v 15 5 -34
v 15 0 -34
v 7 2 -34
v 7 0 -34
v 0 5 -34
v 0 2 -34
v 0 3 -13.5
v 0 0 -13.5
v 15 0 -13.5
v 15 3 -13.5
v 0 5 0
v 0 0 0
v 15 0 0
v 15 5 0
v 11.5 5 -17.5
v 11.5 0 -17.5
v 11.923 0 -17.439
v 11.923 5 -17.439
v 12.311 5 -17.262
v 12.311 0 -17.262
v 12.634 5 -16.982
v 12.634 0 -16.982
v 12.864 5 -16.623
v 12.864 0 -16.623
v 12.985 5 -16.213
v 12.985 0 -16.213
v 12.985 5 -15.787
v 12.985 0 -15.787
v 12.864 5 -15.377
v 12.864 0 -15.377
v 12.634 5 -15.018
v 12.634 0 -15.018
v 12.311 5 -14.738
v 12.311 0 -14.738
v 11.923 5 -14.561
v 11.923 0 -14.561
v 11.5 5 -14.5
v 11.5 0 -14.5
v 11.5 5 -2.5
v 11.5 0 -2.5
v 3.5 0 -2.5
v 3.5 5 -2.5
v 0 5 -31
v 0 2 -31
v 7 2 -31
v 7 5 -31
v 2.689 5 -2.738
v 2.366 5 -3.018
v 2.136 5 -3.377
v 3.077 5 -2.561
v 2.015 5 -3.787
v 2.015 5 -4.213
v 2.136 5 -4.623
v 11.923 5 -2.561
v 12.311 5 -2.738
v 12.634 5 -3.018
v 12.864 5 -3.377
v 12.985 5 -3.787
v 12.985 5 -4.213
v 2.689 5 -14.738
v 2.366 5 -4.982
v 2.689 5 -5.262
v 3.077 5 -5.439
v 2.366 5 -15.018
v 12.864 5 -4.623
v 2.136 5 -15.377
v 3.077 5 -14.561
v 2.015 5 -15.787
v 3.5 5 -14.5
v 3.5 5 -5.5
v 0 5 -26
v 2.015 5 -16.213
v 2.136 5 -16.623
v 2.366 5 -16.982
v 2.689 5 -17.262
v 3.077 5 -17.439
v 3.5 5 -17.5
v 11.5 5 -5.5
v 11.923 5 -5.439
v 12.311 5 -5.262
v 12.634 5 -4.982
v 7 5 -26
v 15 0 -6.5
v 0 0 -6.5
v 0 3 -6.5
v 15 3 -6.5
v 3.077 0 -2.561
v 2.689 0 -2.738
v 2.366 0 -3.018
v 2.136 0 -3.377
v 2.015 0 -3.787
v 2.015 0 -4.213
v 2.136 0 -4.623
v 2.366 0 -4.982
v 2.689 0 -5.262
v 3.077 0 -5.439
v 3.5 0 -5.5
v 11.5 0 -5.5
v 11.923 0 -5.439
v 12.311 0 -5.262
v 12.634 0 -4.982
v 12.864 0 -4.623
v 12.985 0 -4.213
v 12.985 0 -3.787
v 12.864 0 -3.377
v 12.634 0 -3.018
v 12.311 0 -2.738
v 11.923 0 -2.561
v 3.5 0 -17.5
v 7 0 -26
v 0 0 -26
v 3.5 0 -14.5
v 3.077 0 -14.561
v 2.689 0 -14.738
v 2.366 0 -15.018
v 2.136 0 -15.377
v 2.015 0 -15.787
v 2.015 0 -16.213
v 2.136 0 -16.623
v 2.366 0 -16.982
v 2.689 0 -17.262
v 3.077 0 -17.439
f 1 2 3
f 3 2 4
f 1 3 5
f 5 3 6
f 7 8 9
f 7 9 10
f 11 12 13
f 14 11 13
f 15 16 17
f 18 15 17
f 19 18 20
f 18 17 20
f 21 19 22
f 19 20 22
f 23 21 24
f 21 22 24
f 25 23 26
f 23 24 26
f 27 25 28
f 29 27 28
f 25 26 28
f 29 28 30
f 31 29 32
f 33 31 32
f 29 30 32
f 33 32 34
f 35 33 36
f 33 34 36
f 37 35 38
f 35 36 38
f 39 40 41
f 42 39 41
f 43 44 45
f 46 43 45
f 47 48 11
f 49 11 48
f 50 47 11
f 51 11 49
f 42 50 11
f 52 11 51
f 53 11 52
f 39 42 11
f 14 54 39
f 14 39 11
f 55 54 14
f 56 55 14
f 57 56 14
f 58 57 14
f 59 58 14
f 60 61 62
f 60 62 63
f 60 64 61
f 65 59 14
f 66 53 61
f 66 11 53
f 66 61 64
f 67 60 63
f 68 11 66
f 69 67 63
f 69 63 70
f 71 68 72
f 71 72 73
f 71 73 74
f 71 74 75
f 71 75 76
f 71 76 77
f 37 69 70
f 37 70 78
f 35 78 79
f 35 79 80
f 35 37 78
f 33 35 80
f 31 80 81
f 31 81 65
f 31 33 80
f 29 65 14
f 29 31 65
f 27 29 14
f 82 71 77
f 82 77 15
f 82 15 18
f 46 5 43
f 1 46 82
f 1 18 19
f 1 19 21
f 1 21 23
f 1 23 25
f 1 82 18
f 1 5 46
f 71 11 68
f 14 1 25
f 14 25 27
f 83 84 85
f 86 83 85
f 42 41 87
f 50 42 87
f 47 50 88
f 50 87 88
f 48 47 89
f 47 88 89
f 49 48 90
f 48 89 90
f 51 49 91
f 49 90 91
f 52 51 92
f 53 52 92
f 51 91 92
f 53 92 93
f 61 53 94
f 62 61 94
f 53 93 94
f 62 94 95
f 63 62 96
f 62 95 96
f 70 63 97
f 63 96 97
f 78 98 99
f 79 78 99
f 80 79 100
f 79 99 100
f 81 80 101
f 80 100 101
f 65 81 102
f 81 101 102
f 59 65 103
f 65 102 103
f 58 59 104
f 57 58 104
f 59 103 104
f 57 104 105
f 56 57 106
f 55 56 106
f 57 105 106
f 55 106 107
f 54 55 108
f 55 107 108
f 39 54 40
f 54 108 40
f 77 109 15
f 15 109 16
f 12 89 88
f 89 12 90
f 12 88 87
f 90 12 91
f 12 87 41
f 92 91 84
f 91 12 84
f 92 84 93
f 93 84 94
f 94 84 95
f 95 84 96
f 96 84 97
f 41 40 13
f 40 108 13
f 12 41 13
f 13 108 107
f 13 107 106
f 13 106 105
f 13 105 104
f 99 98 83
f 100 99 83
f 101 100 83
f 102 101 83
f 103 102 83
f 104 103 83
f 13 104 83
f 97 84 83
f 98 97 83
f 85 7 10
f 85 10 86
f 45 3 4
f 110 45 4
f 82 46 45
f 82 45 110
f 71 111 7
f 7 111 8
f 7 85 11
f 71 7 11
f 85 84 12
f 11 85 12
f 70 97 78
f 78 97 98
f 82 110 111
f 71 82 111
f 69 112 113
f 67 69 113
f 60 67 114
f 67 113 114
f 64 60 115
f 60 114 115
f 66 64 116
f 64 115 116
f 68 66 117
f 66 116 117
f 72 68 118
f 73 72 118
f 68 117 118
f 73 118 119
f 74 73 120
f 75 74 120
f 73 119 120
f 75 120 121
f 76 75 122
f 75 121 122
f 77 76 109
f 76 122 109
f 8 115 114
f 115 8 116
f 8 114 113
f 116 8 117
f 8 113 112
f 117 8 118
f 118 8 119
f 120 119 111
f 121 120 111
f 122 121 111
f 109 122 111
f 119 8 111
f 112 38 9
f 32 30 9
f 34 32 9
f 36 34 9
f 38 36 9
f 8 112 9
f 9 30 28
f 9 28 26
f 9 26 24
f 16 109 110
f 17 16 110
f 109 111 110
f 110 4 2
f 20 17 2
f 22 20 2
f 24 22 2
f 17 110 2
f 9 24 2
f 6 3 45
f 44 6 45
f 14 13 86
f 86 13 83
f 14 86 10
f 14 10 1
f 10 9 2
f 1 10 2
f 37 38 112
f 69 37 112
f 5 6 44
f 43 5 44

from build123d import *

# Parameters (mm, degrees)
EXTRUDE_1_DEPTH     = 5
SKETCH_2_W          = 7
SKETCH_2_H          = 3
CUT_EXTRUDE_1_DEPTH = 16
SKETCH_3_W          = 3
SKETCH_3_H          = 2
CUT_EXTRUDE_2_DEPTH = 12


with BuildPart() as part:
    # 草图1 → 凸台-拉伸1 (new body)
    with BuildSketch(Plane(origin=(0, 0, 0), x_dir=(1, 0, 0), z_dir=(0, 1, 0))):
        Polygon((15, 34), (0, 34), (0, 31), (7, 31), (7, 26), (0, 26), (0, 0), (15, 0), align=None)
        with BuildLine():
            ThreePointArc((3.5, 2.5), (2, 4), (3.5, 5.5))
            Line((3.5, 5.5), (11.5, 5.5))
            ThreePointArc((11.5, 5.5), (13, 4), (11.5, 2.5))
            Line((11.5, 2.5), (3.5, 2.5))
        make_face(mode=Mode.SUBTRACT)
        with BuildLine():
            ThreePointArc((3.5, 14.5), (2, 16), (3.5, 17.5))
            Line((3.5, 17.5), (11.5, 17.5))
            ThreePointArc((11.5, 17.5), (13, 16), (11.5, 14.5))
            Line((11.5, 14.5), (3.5, 14.5))
        make_face(mode=Mode.SUBTRACT)
    extrude(amount=EXTRUDE_1_DEPTH)

    # 草图2 → 切除-拉伸1 (cut, through all)
    with BuildSketch(Plane.ZY):
        with Locations((-10, 1.5)):
            Rectangle(SKETCH_2_W, SKETCH_2_H)
    extrude(amount=-CUT_EXTRUDE_1_DEPTH, mode=Mode.SUBTRACT)

    # 草图3 → 切除-拉伸2 (cut)
    with BuildSketch(Plane.ZY.offset(-7)):
        with Locations((-32.5, 1)):
            Rectangle(SKETCH_3_W, SKETCH_3_H)
    extrude(amount=CUT_EXTRUDE_2_DEPTH, mode=Mode.SUBTRACT)


solid = part.part
